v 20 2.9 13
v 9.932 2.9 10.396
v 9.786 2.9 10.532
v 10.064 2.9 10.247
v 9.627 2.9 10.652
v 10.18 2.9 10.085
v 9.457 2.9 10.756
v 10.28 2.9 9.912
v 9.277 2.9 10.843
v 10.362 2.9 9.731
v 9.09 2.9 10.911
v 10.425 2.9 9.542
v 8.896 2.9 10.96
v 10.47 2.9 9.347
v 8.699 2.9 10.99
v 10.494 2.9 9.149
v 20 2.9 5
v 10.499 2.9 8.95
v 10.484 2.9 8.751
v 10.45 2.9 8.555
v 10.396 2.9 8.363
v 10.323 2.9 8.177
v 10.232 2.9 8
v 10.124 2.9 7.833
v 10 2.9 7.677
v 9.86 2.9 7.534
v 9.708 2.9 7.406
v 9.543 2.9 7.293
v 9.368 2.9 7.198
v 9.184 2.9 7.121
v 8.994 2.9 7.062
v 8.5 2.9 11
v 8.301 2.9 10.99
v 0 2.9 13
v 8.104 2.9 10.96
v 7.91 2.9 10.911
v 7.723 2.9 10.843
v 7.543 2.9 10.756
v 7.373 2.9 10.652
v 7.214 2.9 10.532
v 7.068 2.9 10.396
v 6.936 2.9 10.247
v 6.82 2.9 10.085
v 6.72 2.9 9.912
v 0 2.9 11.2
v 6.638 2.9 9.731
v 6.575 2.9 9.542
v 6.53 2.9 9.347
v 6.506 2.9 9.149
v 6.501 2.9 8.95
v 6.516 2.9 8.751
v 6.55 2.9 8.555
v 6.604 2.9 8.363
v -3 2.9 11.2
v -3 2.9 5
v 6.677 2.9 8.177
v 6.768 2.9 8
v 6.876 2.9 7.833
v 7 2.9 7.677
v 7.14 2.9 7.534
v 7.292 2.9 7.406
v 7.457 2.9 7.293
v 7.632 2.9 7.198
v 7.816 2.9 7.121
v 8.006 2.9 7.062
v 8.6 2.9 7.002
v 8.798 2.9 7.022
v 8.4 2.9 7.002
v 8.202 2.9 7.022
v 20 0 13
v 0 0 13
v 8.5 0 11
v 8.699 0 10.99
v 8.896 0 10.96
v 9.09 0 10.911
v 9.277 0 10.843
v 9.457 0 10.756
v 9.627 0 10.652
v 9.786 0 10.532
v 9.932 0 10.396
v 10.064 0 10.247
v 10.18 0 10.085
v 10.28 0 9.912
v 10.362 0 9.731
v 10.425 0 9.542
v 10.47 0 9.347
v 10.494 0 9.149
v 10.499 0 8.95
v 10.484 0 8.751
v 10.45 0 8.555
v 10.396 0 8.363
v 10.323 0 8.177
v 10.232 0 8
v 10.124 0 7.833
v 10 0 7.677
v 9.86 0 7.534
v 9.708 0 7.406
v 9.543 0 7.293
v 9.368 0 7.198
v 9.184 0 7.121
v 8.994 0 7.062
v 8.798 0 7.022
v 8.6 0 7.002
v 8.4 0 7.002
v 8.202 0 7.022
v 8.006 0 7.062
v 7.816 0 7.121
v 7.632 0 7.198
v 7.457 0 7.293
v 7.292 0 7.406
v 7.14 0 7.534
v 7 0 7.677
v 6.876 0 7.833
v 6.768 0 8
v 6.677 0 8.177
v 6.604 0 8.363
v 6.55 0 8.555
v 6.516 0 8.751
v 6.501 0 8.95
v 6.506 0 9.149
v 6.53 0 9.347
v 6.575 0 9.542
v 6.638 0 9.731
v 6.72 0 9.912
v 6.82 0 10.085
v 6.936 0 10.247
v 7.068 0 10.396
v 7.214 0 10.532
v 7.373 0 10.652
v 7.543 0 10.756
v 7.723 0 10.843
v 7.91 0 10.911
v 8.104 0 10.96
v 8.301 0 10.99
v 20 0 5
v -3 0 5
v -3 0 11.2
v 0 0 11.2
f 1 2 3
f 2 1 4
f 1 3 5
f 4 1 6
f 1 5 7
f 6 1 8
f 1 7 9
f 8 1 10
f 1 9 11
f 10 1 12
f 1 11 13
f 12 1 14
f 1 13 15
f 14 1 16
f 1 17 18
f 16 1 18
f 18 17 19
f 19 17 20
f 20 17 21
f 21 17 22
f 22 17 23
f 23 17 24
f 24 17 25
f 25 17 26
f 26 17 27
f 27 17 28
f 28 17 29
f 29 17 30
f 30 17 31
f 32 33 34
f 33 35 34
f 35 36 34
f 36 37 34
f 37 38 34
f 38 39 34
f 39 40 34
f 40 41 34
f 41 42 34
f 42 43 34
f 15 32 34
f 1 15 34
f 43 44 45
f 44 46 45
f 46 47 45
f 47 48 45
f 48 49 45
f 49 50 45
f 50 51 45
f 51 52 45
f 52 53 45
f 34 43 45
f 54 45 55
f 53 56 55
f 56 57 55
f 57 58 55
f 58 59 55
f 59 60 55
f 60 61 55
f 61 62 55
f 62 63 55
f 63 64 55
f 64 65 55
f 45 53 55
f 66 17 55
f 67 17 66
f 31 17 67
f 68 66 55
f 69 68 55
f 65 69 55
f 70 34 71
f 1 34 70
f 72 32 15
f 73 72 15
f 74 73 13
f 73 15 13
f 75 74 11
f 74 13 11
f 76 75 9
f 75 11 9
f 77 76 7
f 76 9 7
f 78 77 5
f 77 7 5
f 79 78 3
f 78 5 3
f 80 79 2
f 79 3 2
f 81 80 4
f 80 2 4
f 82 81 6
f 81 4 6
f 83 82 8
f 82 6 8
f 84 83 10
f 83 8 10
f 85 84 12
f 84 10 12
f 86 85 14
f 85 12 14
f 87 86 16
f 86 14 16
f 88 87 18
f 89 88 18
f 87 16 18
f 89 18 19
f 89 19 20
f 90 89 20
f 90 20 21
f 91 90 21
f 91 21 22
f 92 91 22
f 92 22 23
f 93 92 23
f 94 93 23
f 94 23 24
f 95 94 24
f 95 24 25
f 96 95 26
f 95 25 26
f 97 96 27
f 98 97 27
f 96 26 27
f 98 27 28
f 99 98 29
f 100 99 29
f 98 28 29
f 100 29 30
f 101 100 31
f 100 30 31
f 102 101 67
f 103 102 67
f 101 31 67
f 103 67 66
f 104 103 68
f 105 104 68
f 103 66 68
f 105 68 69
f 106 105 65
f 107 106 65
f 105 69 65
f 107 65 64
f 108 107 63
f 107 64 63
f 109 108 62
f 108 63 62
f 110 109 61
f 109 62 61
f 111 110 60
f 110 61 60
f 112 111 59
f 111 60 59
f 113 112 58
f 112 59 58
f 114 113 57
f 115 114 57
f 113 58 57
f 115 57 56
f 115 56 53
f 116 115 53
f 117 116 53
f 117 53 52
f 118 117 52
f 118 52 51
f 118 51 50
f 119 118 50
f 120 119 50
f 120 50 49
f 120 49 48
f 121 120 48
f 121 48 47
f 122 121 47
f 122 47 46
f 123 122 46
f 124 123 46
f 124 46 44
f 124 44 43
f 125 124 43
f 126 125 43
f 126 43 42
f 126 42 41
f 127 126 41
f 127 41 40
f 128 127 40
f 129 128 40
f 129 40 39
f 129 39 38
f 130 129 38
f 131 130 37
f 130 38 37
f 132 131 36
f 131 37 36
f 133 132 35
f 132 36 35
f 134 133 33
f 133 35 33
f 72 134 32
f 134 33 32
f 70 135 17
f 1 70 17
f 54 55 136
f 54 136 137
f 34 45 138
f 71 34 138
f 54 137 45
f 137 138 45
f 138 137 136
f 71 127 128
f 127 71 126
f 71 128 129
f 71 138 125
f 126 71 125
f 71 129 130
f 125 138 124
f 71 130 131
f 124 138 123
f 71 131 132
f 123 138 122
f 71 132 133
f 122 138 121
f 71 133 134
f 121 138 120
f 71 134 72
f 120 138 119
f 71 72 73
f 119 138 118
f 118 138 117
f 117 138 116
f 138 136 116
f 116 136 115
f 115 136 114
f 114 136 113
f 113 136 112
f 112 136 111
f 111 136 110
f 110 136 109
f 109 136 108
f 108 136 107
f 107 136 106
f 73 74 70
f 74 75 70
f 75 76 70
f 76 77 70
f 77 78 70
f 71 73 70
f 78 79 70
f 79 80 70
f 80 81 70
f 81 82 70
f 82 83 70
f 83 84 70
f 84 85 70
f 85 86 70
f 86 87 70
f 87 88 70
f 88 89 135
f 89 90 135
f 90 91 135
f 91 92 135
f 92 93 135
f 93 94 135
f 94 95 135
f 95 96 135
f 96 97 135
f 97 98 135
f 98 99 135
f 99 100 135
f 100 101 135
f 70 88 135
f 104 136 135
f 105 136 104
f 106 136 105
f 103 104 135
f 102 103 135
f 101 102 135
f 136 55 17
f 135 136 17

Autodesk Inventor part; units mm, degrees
ref_plane "YZ Plane" through (0, 0, 0) normal (1, 0, 0) x (0, 1, 0)
ref_plane "XZ Plane" through (0, 0, 0) normal (0, 1, 0) x (-1, 0, 0)
ref_plane "XY Plane" through (0, 0, 0) normal (0, 0, 1) x (1, 0, 0)
ref_plane "Work Plane1" through (0, 0, 5) normal (0, 0, 1) x (1, 0, 0)
sketch "Sketch1" plane through (0, 0, 5) normal (0, 0, 1) x (1, 0, 0)
  line L0 (0, 0) -> (20, 0)
  line L1 (20, 0) -> (20, 2.9)
  line L2 (20, 2.9) -> (0, 2.9)
  line L3 (0, 2.9) -> (0, 0)
  dimension "d2" = 20
  dimension "d1" = 2.9
extrude "Extrusion1" add sketch "Sketch1" along normal blind 8
sketch "Sketch2" plane through (0, 0, 5) normal (-1, 0, 0) x (0, 0, 1)
  line L0 (0, 0) -> (0, 2.9) projected
  line L1 (0, 0) -> (8, 0) projected
  line L2 (0, 0) -> (6.2, 0)
  line L3 (6.2, 0) -> (6.2, 2.9)
  line L4 (6.2, 2.9) -> (0, 2.9)
  line L5 (0, 2.9) -> (0, 0)
  point P0 (-13, 0)
  dimension "d6" = 6.2
extrude "Extrusion2" add sketch "Sketch2" along normal blind 3
sketch "Sketch3" plane through (20, 2.9, 5) normal (0, 1, 0) x (0, 0, 1)
  line L0 (0, 0) -> (0, -23) projected
  line L1 (8, -20) -> (8, 0) projected
  line L2 (0, -20) -> (8, -20)
  line L3 (4, -20) -> (4, -11.5)
  circle A0 centre (4, -11.5) radius 2
  point P0 (-13, -20)
  dimension "d11" = 8.5
  dimension "d10" = 4
extrude "Extrusion3" cut sketch "Sketch3" against normal through all
properties part number "Cap Pulley Support V2 Pt2" material "Thermoplastic Resin"
